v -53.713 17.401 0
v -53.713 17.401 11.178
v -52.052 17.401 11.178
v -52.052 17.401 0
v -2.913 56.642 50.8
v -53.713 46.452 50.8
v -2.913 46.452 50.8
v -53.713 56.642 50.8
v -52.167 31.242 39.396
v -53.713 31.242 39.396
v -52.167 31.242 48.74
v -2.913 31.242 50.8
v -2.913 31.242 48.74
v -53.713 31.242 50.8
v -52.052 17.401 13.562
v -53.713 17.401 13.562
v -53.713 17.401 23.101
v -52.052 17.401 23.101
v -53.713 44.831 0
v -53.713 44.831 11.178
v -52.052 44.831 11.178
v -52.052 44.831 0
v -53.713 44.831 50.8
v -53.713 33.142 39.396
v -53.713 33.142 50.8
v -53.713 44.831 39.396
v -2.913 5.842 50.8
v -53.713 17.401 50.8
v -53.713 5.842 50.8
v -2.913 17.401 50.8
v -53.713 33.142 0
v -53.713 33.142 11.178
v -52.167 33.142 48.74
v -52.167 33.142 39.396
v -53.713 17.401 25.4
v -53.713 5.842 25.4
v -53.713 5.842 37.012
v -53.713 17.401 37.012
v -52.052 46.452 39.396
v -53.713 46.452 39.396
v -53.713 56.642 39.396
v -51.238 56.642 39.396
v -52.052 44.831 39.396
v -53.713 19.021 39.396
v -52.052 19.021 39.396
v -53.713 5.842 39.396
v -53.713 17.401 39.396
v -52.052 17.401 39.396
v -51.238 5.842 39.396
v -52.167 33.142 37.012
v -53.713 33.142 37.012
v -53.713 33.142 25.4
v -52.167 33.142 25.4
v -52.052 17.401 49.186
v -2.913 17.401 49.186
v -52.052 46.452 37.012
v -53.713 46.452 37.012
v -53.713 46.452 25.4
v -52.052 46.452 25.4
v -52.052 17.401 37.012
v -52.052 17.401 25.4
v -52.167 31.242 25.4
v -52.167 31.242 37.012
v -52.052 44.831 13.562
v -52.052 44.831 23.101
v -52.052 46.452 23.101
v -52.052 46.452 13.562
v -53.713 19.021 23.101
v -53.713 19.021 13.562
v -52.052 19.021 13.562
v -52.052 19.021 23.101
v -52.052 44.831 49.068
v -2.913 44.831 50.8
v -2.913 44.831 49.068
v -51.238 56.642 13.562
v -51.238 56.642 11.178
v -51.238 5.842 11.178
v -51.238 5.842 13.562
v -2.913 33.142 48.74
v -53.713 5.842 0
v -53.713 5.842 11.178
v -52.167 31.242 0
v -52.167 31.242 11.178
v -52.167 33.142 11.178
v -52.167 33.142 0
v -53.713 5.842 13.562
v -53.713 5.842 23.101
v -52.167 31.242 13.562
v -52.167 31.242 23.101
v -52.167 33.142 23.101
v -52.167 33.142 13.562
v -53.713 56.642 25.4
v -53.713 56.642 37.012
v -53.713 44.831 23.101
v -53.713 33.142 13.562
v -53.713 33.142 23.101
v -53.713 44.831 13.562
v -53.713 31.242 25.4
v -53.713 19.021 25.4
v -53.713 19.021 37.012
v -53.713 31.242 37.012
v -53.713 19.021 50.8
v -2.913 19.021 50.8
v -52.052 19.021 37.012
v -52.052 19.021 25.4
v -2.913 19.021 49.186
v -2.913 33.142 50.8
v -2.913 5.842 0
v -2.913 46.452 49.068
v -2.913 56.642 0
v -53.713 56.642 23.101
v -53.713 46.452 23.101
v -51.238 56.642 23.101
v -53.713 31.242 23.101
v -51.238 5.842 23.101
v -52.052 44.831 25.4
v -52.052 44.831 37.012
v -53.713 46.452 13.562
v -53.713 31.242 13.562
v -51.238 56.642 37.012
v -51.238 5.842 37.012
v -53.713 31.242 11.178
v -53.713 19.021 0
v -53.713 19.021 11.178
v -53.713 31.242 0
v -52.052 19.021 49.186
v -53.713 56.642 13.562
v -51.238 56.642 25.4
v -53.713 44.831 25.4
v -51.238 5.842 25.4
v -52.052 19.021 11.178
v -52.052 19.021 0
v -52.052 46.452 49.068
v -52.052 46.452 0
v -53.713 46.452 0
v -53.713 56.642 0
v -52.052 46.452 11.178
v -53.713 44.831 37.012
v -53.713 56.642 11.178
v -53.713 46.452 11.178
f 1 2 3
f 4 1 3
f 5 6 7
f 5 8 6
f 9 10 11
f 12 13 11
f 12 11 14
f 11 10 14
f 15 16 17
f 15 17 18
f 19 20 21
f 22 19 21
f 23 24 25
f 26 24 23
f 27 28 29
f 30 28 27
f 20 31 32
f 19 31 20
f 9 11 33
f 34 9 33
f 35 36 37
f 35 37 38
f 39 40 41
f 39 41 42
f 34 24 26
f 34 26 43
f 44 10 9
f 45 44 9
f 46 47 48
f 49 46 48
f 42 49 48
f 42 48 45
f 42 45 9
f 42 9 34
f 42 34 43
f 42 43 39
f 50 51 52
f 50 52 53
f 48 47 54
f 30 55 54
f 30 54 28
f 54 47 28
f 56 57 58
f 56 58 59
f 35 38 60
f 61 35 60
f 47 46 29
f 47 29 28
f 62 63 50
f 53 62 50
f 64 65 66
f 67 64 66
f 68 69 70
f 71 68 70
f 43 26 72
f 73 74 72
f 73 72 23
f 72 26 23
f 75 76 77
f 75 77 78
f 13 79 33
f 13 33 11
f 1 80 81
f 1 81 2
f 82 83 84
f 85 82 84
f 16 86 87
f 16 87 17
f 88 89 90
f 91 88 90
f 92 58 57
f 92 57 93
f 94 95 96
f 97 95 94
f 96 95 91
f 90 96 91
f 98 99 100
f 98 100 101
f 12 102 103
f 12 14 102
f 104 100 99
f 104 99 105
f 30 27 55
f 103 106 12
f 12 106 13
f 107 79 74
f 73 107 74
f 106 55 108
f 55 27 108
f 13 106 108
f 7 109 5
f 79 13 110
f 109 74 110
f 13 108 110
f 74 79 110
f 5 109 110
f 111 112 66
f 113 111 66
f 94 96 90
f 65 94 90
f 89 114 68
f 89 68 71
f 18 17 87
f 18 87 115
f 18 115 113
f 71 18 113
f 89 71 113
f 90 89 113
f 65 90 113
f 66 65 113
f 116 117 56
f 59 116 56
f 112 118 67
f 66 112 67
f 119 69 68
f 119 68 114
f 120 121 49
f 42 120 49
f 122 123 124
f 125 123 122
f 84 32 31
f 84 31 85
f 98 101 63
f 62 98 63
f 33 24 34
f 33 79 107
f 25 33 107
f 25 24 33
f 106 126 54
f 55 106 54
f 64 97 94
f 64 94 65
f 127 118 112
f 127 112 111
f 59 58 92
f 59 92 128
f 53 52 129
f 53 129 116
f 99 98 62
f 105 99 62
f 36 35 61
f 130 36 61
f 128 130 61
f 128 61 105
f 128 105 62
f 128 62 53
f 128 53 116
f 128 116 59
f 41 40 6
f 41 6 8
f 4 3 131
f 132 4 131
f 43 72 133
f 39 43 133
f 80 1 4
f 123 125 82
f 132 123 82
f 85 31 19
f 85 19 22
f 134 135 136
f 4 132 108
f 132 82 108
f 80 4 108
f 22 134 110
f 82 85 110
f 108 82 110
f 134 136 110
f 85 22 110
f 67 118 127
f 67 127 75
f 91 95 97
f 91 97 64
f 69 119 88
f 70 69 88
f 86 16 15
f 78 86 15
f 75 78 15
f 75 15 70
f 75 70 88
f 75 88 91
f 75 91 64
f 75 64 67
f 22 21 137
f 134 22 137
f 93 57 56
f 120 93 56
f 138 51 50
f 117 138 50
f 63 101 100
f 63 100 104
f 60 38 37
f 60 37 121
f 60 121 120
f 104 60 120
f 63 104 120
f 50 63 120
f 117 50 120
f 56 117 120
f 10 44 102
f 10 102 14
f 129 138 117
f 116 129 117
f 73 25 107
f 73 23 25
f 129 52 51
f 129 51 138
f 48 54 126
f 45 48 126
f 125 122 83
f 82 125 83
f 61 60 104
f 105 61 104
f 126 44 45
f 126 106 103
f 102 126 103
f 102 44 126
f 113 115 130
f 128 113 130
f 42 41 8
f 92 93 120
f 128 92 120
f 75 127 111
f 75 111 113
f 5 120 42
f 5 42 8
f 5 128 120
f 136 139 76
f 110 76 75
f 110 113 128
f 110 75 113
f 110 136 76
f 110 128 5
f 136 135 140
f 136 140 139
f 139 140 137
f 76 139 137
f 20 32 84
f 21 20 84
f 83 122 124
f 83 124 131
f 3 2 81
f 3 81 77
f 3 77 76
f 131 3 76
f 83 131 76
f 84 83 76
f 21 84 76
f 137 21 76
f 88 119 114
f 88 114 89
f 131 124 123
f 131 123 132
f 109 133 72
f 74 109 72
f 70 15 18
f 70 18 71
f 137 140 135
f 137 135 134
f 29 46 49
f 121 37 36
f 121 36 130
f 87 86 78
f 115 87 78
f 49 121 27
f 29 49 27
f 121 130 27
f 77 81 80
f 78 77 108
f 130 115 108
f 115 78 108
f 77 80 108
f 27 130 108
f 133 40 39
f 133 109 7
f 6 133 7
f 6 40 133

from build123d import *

# Parameters (mm, degrees)
F0_W      = 50.8
F0_H      = 50.8
F1_DEPTH  = 50.8
F2_W      = 2.475306233
F2_H      = 2.3846663535
F2_H_2    = 2.2988862634
F2_H_3    = 2.3846654221
F3_DEPTH  = 101.6
F4_W      = 1.6616544031
F4_H      = 1.6203634441
F4_W_2    = 1.5459133588
F4_H_2    = 1.9000842679
F5_DEPTH  = 79.502
F6_W      = 1.6203634441
F6_H      = 1.7323351085
F7_DEPTH  = 101.6
F8_W      = 1.9000842679
F8_H      = 2.0599110603
F9_DEPTH  = 101.6
F10_W     = 1.6203634441
F10_H     = 1.6135318756
F11_DEPTH = 101.6


with BuildPart() as f1:
    # F0 (on Top) → F1 (new body)
    with BuildSketch(Plane.XY):
        with Locations((-28.3131762408, 31.2416404974)):
            Rectangle(F0_W, F0_H)
    extrude(amount=F1_DEPTH)

    # F2 (on face) → F3 (cut)
    with BuildSketch(Plane.XZ.offset(-5.8416404974)):
        with Locations((-52.4755231243, 38.2039975375)):
            Rectangle(F2_W, F2_H)
        with Locations((-52.4755231243, 24.2505568683)):
            Rectangle(F2_W, F2_H_2)
        with Locations((-52.4755231243, 12.3701184057)):
            Rectangle(F2_W, F2_H_3)
    extrude(amount=-F3_DEPTH, mode=Mode.SUBTRACT)

    # F4 (on face) → F5 (cut)
    with BuildSketch(Plane.XY.offset(50.8)):
        with Locations((-52.8823490392, 45.6416811794)):
            Rectangle(F4_W, F4_H)
        with Locations((-52.9402195614, 32.1916826314)):
            Rectangle(F4_W_2, F4_H_2)
        with Locations((-52.8823490392, 18.2112250477)):
            Rectangle(F4_W, F4_H)
    extrude(amount=-F5_DEPTH, mode=Mode.SUBTRACT)

    # F6 (on face) → F7 (cut)
    with BuildSketch(Plane(origin=(-52.0515218377, 0, 0), x_dir=(0, -1, 0), z_dir=(-1, 0, 0))):
        with Locations((-45.6416811794, 49.9338324457)):
            Rectangle(F6_W, F6_H)
    extrude(amount=-F7_DEPTH, mode=Mode.SUBTRACT)

    # F8 (on face) → F9 (cut)
    with BuildSketch(Plane(origin=(-52.167262882, 0, 0), x_dir=(0, -1, 0), z_dir=(-1, 0, 0))):
        with Locations((-32.1916826314, 49.7700444698)):
            Rectangle(F8_W, F8_H)
    extrude(amount=-F9_DEPTH, mode=Mode.SUBTRACT)

    # F10 (on face) → F11 (cut)
    with BuildSketch(Plane(origin=(-52.0515218377, 0, 0), x_dir=(0, -1, 0), z_dir=(-1, 0, 0))):
        with Locations((-18.2112250477, 49.9932340622)):
            Rectangle(F10_W, F10_H)
    extrude(amount=-F11_DEPTH, mode=Mode.SUBTRACT)


solid = f1.part
